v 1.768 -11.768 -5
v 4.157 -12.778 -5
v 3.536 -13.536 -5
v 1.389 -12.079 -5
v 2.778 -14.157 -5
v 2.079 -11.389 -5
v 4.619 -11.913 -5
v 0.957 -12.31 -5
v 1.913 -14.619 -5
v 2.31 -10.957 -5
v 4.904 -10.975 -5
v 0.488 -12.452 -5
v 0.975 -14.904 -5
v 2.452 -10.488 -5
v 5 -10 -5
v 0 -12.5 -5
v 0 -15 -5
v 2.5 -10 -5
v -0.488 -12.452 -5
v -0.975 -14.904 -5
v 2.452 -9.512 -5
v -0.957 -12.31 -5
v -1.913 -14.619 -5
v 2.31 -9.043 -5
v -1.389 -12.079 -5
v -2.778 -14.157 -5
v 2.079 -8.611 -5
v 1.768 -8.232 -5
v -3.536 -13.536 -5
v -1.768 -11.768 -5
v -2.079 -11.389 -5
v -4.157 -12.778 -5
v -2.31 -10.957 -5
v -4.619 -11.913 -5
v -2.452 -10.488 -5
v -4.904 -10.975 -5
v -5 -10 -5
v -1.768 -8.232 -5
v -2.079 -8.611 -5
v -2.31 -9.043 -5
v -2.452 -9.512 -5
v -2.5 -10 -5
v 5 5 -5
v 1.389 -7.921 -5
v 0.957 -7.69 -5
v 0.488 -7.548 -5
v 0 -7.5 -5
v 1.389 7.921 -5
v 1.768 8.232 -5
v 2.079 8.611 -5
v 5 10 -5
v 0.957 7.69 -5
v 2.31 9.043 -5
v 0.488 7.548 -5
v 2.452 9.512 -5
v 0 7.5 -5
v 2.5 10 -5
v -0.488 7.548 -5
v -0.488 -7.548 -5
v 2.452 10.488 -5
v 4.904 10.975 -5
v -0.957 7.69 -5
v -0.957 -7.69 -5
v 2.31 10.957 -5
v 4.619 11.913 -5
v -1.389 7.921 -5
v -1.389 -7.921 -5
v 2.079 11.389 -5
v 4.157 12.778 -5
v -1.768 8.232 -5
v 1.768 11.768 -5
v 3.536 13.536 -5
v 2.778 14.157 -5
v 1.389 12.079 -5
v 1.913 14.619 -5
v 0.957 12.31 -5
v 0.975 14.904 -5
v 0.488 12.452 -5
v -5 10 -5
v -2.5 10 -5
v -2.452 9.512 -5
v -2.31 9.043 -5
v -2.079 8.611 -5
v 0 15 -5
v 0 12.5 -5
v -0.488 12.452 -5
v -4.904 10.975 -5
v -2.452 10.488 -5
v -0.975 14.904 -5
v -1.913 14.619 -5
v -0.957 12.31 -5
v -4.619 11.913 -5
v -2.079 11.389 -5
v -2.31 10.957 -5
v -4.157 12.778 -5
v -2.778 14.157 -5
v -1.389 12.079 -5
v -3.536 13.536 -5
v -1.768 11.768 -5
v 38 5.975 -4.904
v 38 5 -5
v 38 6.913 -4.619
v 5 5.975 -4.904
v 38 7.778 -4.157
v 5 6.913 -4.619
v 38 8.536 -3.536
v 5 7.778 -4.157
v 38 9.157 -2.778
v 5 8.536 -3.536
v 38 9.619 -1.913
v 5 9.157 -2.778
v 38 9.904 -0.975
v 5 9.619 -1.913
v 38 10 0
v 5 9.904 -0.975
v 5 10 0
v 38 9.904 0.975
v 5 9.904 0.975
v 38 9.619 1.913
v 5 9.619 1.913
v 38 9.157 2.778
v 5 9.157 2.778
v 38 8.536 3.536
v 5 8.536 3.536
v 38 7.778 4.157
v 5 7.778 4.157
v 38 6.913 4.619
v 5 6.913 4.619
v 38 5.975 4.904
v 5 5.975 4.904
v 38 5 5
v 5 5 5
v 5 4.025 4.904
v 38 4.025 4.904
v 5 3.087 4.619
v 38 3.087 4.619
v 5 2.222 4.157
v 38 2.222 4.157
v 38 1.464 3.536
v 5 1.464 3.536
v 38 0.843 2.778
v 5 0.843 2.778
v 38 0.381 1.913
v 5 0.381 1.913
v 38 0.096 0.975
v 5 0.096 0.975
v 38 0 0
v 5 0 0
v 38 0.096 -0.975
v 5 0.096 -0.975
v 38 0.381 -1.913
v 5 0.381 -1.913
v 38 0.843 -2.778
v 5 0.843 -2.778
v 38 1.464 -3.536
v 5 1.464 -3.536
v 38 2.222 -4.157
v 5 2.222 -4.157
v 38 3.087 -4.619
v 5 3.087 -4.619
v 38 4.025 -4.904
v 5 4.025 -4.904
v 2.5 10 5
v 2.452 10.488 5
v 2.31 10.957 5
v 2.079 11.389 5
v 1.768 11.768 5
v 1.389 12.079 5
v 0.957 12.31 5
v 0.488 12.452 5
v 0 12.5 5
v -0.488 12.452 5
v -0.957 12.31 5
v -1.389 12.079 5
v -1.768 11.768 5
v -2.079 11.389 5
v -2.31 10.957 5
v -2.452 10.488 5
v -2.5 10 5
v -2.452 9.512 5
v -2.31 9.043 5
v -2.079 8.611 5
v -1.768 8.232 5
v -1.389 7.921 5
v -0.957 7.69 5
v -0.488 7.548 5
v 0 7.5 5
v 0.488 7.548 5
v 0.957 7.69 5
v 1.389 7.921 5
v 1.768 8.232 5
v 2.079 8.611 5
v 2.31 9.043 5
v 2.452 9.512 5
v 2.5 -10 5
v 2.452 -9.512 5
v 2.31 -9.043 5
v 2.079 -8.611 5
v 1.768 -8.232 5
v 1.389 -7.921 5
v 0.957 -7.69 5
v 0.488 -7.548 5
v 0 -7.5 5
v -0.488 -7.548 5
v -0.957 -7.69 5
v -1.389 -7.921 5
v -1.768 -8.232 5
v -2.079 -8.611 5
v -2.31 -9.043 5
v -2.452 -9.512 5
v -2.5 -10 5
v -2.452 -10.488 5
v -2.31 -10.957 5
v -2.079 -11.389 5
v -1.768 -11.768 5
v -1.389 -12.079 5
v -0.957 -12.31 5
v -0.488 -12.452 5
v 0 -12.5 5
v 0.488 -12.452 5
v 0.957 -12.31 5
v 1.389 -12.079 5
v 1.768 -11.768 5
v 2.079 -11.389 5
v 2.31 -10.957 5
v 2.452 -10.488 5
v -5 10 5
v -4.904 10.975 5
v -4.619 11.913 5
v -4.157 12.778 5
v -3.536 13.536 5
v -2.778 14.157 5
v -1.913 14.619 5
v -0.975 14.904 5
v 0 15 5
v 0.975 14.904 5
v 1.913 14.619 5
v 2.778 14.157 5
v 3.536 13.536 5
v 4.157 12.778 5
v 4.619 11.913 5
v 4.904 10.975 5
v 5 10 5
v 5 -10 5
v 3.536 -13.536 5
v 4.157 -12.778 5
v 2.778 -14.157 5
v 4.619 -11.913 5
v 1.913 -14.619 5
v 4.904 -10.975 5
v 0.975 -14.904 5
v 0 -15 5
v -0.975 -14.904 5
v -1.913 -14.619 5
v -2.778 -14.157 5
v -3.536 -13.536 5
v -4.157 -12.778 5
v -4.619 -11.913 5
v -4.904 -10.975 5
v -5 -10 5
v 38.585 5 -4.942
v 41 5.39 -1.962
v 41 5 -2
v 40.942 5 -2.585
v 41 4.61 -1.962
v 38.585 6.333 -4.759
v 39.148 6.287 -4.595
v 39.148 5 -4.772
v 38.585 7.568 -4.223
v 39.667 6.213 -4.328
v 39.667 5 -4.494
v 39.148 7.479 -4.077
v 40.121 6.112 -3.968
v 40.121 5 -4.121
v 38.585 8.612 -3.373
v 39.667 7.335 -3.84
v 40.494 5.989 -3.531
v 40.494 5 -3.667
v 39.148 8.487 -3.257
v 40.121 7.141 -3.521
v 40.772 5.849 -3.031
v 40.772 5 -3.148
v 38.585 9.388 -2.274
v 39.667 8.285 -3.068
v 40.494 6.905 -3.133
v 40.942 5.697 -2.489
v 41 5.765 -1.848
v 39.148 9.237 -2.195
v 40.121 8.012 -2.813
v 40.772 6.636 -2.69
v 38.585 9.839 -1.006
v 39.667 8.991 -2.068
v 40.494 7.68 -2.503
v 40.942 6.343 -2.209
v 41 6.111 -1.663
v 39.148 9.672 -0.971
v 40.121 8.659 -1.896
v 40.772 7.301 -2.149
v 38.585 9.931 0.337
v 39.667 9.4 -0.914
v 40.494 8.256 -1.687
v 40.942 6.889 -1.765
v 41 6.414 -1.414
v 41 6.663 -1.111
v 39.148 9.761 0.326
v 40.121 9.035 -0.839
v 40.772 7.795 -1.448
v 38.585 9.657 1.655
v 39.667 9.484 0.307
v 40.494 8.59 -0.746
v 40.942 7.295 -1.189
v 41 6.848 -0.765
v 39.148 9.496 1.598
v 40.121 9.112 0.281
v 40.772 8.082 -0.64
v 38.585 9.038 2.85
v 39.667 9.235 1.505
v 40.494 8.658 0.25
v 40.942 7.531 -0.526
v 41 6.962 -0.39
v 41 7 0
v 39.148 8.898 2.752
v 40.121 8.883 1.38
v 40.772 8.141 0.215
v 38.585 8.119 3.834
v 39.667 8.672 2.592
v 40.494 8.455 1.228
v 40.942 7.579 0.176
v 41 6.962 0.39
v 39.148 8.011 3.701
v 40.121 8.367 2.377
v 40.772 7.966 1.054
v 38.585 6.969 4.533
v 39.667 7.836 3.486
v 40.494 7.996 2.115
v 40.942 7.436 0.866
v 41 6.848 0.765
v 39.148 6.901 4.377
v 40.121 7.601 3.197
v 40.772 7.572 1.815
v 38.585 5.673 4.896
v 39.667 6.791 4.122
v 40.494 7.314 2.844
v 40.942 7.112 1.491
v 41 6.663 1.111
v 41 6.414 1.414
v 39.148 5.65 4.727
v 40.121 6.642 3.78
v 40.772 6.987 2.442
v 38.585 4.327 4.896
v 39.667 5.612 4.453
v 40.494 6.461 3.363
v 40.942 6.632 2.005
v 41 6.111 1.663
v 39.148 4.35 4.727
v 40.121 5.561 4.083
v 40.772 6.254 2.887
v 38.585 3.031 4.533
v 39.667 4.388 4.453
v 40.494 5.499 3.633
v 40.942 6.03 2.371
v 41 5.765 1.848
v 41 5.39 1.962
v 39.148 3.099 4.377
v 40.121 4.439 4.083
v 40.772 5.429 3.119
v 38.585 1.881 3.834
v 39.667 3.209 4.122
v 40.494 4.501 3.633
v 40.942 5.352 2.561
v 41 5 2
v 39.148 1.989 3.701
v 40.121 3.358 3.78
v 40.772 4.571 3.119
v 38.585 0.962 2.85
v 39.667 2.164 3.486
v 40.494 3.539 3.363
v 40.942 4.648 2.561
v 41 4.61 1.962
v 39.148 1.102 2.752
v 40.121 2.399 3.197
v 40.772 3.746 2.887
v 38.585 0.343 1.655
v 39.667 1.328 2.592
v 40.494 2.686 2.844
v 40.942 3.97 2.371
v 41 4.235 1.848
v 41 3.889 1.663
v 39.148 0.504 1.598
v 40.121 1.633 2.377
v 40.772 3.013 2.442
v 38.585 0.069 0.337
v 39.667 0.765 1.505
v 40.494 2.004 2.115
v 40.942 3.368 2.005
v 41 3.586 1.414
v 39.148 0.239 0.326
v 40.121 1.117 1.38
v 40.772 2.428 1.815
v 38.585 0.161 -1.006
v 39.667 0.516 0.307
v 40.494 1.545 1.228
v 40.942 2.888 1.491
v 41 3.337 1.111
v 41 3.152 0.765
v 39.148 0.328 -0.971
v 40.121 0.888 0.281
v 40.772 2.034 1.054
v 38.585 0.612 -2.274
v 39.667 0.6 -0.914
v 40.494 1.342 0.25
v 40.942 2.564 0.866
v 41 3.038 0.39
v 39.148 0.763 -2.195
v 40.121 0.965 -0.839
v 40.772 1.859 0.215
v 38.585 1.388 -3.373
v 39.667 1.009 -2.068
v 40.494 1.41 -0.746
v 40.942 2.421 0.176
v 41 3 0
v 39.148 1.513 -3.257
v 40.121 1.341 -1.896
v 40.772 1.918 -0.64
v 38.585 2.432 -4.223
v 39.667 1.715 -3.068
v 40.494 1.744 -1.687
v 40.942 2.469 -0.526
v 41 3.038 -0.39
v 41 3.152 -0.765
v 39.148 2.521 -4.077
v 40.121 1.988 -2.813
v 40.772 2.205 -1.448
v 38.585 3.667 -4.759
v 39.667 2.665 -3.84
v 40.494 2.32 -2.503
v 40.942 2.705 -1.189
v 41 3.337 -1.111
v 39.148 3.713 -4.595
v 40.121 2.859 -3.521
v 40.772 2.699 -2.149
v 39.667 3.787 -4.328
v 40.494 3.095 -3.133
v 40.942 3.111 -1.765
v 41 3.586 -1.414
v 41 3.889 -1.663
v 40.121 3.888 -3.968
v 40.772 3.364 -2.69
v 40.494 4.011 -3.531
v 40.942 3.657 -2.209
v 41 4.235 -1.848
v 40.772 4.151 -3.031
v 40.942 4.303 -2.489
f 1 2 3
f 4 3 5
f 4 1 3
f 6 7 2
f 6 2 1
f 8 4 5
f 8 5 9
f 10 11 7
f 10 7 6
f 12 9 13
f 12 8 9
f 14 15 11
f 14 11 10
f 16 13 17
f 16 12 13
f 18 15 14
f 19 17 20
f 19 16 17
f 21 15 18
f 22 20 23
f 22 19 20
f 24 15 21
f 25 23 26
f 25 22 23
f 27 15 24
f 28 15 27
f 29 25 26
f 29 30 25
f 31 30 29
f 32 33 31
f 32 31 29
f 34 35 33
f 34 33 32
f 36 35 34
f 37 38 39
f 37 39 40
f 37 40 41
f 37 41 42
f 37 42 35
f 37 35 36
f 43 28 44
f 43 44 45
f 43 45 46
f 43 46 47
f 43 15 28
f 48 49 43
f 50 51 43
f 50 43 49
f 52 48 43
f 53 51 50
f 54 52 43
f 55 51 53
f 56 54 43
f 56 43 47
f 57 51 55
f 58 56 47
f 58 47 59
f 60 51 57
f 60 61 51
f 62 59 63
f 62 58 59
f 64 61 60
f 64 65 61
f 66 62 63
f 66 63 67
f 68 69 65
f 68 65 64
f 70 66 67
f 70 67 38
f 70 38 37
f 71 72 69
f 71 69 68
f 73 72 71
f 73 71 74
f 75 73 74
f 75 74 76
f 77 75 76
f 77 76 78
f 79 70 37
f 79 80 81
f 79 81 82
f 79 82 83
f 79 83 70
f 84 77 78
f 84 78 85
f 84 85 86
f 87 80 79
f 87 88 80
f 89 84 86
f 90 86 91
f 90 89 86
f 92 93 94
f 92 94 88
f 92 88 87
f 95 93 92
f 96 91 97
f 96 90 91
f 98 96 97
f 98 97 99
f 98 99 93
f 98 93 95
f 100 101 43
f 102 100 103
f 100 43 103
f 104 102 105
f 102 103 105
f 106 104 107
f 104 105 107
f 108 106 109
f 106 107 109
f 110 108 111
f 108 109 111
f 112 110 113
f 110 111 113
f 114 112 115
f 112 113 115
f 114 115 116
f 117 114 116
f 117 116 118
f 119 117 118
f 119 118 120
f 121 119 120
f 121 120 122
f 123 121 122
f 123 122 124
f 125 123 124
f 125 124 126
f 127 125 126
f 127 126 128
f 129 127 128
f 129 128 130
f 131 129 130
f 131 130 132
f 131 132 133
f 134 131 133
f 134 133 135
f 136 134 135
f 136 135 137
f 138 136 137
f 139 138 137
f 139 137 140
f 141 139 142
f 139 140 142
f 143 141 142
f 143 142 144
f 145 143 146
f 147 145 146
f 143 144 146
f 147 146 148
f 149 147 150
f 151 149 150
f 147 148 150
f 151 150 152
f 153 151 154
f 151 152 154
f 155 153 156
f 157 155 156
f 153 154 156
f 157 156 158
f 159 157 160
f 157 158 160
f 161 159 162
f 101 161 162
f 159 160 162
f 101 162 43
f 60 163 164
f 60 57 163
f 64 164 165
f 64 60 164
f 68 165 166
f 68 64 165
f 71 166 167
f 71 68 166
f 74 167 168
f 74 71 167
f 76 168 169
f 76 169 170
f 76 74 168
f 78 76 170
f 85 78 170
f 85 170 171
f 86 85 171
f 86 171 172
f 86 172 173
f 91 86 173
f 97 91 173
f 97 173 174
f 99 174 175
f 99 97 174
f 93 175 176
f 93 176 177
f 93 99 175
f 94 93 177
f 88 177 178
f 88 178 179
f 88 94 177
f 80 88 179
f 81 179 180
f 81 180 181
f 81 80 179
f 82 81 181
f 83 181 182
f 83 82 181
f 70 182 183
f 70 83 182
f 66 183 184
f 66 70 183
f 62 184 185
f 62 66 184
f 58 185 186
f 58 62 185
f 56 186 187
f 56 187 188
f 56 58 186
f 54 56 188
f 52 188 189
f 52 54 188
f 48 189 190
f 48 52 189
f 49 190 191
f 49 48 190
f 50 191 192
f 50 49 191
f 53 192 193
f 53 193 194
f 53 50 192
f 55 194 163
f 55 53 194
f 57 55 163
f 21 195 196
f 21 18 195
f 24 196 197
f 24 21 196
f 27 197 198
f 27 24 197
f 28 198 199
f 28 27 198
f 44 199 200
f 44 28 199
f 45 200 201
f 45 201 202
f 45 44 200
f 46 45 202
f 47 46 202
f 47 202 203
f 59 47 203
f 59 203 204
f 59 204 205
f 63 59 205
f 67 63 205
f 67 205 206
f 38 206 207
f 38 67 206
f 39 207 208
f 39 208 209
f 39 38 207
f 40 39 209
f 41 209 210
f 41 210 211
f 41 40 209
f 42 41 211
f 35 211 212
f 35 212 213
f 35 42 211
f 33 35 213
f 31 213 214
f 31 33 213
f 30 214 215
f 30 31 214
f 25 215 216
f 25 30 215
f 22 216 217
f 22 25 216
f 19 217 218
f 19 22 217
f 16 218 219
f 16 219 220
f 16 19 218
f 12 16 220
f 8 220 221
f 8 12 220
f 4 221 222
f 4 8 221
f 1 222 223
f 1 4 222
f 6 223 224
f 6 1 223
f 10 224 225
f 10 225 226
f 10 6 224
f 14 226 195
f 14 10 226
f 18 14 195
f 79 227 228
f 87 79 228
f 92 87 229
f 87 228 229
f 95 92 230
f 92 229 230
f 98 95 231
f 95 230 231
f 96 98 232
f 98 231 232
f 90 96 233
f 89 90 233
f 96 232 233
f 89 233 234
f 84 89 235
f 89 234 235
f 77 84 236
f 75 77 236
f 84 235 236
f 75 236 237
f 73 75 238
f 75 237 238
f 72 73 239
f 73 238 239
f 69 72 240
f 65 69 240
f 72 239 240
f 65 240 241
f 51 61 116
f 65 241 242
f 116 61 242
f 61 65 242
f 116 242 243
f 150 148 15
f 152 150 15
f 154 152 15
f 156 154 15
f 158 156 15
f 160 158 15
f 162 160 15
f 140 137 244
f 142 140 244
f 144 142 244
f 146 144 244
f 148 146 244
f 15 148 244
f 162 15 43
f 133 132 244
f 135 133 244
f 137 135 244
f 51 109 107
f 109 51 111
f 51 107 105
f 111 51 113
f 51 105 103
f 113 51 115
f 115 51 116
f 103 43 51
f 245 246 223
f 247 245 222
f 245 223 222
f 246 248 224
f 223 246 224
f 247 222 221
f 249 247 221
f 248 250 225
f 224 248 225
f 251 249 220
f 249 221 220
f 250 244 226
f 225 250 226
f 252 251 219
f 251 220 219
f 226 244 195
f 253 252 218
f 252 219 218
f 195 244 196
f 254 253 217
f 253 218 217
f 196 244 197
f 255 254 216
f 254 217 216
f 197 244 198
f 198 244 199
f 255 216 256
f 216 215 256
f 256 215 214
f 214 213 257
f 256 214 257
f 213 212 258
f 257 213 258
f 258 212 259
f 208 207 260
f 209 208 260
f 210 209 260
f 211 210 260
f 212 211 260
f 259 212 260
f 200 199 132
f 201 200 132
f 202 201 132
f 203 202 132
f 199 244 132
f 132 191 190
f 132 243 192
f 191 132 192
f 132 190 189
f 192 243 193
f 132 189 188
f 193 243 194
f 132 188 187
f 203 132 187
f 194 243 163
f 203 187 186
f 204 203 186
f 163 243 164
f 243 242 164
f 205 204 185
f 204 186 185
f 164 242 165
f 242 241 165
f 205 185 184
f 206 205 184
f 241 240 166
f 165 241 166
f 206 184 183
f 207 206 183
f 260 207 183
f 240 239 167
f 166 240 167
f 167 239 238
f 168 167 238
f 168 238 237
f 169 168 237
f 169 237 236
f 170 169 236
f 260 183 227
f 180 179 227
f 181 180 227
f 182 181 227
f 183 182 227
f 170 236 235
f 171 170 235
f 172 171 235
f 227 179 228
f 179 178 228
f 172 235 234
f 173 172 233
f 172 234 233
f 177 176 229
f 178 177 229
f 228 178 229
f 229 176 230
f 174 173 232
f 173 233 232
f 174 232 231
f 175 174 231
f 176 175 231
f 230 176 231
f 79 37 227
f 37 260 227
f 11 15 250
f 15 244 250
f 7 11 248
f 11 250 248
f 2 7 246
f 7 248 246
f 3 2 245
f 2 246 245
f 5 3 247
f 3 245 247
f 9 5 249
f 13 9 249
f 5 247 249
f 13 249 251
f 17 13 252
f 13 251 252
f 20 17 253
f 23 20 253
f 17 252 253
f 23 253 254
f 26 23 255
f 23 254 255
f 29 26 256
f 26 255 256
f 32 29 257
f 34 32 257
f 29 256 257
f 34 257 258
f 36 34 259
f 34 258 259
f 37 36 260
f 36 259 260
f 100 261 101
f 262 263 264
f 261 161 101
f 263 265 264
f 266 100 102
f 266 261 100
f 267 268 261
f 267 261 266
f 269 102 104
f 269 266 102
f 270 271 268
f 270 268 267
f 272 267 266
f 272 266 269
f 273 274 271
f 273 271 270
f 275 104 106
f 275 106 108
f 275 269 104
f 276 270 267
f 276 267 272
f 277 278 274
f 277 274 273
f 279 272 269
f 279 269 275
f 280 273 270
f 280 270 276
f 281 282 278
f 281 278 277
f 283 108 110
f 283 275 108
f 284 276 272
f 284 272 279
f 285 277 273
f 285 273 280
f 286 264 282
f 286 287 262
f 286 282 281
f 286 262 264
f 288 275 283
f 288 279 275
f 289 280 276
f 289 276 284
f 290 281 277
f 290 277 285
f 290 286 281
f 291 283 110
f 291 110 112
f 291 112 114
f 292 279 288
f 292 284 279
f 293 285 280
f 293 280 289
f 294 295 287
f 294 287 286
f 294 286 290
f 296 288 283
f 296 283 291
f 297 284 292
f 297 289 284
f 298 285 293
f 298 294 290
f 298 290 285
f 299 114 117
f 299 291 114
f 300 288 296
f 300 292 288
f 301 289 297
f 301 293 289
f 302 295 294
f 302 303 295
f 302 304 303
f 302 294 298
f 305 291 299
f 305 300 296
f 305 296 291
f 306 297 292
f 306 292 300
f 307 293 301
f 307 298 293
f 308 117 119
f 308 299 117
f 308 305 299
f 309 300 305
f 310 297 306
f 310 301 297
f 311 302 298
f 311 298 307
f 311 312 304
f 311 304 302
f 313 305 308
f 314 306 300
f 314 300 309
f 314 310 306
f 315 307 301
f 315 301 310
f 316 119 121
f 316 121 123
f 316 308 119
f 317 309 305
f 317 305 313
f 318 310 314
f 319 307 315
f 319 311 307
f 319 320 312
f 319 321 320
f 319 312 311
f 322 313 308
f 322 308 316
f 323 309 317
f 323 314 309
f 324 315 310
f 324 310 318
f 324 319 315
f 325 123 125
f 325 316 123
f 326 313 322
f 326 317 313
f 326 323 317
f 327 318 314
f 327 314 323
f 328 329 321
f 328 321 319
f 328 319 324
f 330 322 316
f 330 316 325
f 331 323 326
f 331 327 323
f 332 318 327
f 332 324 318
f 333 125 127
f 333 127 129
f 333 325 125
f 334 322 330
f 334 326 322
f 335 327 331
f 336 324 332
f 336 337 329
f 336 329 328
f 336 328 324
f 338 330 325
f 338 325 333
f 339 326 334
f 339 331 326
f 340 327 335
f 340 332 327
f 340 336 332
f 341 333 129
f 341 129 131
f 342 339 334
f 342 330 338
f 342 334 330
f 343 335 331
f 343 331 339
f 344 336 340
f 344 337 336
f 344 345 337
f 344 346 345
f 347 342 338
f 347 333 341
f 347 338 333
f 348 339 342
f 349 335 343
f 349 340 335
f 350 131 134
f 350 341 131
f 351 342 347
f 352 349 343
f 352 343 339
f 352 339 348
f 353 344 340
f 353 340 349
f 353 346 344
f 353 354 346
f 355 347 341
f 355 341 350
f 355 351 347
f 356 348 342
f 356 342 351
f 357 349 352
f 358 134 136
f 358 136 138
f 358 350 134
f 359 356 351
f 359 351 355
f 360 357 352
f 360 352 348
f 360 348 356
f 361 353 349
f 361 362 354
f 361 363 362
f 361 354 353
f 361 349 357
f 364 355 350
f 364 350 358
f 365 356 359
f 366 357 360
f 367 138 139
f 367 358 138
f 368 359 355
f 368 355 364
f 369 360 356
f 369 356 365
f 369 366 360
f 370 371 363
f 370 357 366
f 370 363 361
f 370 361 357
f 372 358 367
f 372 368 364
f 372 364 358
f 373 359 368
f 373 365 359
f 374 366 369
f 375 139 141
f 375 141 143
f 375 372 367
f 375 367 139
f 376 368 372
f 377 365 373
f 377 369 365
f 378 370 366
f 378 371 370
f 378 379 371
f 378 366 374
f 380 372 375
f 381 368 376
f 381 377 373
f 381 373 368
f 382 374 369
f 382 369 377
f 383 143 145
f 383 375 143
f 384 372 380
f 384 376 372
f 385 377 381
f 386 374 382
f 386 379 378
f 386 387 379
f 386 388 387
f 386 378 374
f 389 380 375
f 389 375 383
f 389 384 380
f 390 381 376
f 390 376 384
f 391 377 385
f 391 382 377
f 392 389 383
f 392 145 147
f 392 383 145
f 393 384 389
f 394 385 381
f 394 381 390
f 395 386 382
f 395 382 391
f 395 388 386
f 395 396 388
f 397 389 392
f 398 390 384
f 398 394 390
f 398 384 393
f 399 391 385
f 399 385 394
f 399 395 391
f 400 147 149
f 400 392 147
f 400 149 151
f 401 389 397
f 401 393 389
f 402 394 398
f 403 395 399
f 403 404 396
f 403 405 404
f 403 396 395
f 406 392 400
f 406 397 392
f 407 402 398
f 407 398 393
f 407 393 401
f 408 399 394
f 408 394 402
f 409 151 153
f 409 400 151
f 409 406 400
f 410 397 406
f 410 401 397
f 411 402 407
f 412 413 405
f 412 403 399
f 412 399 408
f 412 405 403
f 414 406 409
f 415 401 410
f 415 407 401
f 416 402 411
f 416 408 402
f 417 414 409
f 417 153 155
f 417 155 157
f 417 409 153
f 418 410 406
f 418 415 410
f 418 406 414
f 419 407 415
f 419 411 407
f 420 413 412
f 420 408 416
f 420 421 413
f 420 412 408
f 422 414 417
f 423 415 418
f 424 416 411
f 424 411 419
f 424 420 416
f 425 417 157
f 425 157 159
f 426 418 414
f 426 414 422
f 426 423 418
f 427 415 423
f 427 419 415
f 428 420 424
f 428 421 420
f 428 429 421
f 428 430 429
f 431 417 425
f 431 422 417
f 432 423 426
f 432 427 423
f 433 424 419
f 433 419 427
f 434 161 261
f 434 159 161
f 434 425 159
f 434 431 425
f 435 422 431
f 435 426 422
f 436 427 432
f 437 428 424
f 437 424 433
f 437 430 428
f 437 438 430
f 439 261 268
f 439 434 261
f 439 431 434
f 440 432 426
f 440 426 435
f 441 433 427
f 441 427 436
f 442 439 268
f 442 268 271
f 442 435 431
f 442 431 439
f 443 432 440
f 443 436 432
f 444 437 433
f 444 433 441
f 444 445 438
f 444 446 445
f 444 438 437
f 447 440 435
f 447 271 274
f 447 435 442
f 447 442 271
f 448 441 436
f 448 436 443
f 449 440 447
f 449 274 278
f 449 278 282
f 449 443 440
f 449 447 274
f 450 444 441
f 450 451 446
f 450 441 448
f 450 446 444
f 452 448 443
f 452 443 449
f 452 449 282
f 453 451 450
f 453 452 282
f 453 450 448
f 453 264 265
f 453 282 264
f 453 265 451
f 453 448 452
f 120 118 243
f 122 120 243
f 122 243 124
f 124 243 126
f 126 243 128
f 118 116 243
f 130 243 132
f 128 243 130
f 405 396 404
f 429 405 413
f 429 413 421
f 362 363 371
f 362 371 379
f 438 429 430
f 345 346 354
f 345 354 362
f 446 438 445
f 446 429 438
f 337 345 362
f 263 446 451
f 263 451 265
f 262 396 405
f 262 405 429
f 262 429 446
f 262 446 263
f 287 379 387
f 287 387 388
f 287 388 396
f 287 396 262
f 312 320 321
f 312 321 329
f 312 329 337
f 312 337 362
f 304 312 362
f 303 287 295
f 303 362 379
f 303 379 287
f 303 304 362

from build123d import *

# Parameters (mm, degrees)
ESQUISSE1_R        = 2.5
BOSS_EXTRU_1_DEPTH = 5
ESQUISSE2_R        = 5
BOSS_EXTRU_2_DEPTH = 36
CONG_1_R           = 3


with BuildPart() as part:
    # Esquisse1 → Boss.-Extru.1 (new, symmetric)
    with BuildSketch(Plane.XY):
        with BuildLine():
            Line((5, 10), (5, -10))
            ThreePointArc((5, -10), (0, -15), (-5, -10))
            Line((-5, -10), (-5, 10))
            ThreePointArc((-5, 10), (0, 15), (5, 10))
        make_face()
        with Locations((0, 10)):
            Circle(ESQUISSE1_R, mode=Mode.SUBTRACT)
        with Locations((0, -10)):
            Circle(ESQUISSE1_R, mode=Mode.SUBTRACT)
    extrude(amount=BOSS_EXTRU_1_DEPTH, both=True)

    # Esquisse2 → Boss.-Extru.2 (add)
    with BuildSketch(Plane(origin=(5, 0, 0), x_dir=(0, 0, -1), z_dir=(1, 0, 0))):
        with Locations((0, 5)):
            Circle(ESQUISSE2_R)
    extrude(amount=BOSS_EXTRU_2_DEPTH)

    # Congé1
    cong_1_edges = [part.edges().sort_by_distance(p)[0] for p in [
        (41, 5, 5),
    ]]
    fillet(cong_1_edges, radius=CONG_1_R)


solid = part.part
